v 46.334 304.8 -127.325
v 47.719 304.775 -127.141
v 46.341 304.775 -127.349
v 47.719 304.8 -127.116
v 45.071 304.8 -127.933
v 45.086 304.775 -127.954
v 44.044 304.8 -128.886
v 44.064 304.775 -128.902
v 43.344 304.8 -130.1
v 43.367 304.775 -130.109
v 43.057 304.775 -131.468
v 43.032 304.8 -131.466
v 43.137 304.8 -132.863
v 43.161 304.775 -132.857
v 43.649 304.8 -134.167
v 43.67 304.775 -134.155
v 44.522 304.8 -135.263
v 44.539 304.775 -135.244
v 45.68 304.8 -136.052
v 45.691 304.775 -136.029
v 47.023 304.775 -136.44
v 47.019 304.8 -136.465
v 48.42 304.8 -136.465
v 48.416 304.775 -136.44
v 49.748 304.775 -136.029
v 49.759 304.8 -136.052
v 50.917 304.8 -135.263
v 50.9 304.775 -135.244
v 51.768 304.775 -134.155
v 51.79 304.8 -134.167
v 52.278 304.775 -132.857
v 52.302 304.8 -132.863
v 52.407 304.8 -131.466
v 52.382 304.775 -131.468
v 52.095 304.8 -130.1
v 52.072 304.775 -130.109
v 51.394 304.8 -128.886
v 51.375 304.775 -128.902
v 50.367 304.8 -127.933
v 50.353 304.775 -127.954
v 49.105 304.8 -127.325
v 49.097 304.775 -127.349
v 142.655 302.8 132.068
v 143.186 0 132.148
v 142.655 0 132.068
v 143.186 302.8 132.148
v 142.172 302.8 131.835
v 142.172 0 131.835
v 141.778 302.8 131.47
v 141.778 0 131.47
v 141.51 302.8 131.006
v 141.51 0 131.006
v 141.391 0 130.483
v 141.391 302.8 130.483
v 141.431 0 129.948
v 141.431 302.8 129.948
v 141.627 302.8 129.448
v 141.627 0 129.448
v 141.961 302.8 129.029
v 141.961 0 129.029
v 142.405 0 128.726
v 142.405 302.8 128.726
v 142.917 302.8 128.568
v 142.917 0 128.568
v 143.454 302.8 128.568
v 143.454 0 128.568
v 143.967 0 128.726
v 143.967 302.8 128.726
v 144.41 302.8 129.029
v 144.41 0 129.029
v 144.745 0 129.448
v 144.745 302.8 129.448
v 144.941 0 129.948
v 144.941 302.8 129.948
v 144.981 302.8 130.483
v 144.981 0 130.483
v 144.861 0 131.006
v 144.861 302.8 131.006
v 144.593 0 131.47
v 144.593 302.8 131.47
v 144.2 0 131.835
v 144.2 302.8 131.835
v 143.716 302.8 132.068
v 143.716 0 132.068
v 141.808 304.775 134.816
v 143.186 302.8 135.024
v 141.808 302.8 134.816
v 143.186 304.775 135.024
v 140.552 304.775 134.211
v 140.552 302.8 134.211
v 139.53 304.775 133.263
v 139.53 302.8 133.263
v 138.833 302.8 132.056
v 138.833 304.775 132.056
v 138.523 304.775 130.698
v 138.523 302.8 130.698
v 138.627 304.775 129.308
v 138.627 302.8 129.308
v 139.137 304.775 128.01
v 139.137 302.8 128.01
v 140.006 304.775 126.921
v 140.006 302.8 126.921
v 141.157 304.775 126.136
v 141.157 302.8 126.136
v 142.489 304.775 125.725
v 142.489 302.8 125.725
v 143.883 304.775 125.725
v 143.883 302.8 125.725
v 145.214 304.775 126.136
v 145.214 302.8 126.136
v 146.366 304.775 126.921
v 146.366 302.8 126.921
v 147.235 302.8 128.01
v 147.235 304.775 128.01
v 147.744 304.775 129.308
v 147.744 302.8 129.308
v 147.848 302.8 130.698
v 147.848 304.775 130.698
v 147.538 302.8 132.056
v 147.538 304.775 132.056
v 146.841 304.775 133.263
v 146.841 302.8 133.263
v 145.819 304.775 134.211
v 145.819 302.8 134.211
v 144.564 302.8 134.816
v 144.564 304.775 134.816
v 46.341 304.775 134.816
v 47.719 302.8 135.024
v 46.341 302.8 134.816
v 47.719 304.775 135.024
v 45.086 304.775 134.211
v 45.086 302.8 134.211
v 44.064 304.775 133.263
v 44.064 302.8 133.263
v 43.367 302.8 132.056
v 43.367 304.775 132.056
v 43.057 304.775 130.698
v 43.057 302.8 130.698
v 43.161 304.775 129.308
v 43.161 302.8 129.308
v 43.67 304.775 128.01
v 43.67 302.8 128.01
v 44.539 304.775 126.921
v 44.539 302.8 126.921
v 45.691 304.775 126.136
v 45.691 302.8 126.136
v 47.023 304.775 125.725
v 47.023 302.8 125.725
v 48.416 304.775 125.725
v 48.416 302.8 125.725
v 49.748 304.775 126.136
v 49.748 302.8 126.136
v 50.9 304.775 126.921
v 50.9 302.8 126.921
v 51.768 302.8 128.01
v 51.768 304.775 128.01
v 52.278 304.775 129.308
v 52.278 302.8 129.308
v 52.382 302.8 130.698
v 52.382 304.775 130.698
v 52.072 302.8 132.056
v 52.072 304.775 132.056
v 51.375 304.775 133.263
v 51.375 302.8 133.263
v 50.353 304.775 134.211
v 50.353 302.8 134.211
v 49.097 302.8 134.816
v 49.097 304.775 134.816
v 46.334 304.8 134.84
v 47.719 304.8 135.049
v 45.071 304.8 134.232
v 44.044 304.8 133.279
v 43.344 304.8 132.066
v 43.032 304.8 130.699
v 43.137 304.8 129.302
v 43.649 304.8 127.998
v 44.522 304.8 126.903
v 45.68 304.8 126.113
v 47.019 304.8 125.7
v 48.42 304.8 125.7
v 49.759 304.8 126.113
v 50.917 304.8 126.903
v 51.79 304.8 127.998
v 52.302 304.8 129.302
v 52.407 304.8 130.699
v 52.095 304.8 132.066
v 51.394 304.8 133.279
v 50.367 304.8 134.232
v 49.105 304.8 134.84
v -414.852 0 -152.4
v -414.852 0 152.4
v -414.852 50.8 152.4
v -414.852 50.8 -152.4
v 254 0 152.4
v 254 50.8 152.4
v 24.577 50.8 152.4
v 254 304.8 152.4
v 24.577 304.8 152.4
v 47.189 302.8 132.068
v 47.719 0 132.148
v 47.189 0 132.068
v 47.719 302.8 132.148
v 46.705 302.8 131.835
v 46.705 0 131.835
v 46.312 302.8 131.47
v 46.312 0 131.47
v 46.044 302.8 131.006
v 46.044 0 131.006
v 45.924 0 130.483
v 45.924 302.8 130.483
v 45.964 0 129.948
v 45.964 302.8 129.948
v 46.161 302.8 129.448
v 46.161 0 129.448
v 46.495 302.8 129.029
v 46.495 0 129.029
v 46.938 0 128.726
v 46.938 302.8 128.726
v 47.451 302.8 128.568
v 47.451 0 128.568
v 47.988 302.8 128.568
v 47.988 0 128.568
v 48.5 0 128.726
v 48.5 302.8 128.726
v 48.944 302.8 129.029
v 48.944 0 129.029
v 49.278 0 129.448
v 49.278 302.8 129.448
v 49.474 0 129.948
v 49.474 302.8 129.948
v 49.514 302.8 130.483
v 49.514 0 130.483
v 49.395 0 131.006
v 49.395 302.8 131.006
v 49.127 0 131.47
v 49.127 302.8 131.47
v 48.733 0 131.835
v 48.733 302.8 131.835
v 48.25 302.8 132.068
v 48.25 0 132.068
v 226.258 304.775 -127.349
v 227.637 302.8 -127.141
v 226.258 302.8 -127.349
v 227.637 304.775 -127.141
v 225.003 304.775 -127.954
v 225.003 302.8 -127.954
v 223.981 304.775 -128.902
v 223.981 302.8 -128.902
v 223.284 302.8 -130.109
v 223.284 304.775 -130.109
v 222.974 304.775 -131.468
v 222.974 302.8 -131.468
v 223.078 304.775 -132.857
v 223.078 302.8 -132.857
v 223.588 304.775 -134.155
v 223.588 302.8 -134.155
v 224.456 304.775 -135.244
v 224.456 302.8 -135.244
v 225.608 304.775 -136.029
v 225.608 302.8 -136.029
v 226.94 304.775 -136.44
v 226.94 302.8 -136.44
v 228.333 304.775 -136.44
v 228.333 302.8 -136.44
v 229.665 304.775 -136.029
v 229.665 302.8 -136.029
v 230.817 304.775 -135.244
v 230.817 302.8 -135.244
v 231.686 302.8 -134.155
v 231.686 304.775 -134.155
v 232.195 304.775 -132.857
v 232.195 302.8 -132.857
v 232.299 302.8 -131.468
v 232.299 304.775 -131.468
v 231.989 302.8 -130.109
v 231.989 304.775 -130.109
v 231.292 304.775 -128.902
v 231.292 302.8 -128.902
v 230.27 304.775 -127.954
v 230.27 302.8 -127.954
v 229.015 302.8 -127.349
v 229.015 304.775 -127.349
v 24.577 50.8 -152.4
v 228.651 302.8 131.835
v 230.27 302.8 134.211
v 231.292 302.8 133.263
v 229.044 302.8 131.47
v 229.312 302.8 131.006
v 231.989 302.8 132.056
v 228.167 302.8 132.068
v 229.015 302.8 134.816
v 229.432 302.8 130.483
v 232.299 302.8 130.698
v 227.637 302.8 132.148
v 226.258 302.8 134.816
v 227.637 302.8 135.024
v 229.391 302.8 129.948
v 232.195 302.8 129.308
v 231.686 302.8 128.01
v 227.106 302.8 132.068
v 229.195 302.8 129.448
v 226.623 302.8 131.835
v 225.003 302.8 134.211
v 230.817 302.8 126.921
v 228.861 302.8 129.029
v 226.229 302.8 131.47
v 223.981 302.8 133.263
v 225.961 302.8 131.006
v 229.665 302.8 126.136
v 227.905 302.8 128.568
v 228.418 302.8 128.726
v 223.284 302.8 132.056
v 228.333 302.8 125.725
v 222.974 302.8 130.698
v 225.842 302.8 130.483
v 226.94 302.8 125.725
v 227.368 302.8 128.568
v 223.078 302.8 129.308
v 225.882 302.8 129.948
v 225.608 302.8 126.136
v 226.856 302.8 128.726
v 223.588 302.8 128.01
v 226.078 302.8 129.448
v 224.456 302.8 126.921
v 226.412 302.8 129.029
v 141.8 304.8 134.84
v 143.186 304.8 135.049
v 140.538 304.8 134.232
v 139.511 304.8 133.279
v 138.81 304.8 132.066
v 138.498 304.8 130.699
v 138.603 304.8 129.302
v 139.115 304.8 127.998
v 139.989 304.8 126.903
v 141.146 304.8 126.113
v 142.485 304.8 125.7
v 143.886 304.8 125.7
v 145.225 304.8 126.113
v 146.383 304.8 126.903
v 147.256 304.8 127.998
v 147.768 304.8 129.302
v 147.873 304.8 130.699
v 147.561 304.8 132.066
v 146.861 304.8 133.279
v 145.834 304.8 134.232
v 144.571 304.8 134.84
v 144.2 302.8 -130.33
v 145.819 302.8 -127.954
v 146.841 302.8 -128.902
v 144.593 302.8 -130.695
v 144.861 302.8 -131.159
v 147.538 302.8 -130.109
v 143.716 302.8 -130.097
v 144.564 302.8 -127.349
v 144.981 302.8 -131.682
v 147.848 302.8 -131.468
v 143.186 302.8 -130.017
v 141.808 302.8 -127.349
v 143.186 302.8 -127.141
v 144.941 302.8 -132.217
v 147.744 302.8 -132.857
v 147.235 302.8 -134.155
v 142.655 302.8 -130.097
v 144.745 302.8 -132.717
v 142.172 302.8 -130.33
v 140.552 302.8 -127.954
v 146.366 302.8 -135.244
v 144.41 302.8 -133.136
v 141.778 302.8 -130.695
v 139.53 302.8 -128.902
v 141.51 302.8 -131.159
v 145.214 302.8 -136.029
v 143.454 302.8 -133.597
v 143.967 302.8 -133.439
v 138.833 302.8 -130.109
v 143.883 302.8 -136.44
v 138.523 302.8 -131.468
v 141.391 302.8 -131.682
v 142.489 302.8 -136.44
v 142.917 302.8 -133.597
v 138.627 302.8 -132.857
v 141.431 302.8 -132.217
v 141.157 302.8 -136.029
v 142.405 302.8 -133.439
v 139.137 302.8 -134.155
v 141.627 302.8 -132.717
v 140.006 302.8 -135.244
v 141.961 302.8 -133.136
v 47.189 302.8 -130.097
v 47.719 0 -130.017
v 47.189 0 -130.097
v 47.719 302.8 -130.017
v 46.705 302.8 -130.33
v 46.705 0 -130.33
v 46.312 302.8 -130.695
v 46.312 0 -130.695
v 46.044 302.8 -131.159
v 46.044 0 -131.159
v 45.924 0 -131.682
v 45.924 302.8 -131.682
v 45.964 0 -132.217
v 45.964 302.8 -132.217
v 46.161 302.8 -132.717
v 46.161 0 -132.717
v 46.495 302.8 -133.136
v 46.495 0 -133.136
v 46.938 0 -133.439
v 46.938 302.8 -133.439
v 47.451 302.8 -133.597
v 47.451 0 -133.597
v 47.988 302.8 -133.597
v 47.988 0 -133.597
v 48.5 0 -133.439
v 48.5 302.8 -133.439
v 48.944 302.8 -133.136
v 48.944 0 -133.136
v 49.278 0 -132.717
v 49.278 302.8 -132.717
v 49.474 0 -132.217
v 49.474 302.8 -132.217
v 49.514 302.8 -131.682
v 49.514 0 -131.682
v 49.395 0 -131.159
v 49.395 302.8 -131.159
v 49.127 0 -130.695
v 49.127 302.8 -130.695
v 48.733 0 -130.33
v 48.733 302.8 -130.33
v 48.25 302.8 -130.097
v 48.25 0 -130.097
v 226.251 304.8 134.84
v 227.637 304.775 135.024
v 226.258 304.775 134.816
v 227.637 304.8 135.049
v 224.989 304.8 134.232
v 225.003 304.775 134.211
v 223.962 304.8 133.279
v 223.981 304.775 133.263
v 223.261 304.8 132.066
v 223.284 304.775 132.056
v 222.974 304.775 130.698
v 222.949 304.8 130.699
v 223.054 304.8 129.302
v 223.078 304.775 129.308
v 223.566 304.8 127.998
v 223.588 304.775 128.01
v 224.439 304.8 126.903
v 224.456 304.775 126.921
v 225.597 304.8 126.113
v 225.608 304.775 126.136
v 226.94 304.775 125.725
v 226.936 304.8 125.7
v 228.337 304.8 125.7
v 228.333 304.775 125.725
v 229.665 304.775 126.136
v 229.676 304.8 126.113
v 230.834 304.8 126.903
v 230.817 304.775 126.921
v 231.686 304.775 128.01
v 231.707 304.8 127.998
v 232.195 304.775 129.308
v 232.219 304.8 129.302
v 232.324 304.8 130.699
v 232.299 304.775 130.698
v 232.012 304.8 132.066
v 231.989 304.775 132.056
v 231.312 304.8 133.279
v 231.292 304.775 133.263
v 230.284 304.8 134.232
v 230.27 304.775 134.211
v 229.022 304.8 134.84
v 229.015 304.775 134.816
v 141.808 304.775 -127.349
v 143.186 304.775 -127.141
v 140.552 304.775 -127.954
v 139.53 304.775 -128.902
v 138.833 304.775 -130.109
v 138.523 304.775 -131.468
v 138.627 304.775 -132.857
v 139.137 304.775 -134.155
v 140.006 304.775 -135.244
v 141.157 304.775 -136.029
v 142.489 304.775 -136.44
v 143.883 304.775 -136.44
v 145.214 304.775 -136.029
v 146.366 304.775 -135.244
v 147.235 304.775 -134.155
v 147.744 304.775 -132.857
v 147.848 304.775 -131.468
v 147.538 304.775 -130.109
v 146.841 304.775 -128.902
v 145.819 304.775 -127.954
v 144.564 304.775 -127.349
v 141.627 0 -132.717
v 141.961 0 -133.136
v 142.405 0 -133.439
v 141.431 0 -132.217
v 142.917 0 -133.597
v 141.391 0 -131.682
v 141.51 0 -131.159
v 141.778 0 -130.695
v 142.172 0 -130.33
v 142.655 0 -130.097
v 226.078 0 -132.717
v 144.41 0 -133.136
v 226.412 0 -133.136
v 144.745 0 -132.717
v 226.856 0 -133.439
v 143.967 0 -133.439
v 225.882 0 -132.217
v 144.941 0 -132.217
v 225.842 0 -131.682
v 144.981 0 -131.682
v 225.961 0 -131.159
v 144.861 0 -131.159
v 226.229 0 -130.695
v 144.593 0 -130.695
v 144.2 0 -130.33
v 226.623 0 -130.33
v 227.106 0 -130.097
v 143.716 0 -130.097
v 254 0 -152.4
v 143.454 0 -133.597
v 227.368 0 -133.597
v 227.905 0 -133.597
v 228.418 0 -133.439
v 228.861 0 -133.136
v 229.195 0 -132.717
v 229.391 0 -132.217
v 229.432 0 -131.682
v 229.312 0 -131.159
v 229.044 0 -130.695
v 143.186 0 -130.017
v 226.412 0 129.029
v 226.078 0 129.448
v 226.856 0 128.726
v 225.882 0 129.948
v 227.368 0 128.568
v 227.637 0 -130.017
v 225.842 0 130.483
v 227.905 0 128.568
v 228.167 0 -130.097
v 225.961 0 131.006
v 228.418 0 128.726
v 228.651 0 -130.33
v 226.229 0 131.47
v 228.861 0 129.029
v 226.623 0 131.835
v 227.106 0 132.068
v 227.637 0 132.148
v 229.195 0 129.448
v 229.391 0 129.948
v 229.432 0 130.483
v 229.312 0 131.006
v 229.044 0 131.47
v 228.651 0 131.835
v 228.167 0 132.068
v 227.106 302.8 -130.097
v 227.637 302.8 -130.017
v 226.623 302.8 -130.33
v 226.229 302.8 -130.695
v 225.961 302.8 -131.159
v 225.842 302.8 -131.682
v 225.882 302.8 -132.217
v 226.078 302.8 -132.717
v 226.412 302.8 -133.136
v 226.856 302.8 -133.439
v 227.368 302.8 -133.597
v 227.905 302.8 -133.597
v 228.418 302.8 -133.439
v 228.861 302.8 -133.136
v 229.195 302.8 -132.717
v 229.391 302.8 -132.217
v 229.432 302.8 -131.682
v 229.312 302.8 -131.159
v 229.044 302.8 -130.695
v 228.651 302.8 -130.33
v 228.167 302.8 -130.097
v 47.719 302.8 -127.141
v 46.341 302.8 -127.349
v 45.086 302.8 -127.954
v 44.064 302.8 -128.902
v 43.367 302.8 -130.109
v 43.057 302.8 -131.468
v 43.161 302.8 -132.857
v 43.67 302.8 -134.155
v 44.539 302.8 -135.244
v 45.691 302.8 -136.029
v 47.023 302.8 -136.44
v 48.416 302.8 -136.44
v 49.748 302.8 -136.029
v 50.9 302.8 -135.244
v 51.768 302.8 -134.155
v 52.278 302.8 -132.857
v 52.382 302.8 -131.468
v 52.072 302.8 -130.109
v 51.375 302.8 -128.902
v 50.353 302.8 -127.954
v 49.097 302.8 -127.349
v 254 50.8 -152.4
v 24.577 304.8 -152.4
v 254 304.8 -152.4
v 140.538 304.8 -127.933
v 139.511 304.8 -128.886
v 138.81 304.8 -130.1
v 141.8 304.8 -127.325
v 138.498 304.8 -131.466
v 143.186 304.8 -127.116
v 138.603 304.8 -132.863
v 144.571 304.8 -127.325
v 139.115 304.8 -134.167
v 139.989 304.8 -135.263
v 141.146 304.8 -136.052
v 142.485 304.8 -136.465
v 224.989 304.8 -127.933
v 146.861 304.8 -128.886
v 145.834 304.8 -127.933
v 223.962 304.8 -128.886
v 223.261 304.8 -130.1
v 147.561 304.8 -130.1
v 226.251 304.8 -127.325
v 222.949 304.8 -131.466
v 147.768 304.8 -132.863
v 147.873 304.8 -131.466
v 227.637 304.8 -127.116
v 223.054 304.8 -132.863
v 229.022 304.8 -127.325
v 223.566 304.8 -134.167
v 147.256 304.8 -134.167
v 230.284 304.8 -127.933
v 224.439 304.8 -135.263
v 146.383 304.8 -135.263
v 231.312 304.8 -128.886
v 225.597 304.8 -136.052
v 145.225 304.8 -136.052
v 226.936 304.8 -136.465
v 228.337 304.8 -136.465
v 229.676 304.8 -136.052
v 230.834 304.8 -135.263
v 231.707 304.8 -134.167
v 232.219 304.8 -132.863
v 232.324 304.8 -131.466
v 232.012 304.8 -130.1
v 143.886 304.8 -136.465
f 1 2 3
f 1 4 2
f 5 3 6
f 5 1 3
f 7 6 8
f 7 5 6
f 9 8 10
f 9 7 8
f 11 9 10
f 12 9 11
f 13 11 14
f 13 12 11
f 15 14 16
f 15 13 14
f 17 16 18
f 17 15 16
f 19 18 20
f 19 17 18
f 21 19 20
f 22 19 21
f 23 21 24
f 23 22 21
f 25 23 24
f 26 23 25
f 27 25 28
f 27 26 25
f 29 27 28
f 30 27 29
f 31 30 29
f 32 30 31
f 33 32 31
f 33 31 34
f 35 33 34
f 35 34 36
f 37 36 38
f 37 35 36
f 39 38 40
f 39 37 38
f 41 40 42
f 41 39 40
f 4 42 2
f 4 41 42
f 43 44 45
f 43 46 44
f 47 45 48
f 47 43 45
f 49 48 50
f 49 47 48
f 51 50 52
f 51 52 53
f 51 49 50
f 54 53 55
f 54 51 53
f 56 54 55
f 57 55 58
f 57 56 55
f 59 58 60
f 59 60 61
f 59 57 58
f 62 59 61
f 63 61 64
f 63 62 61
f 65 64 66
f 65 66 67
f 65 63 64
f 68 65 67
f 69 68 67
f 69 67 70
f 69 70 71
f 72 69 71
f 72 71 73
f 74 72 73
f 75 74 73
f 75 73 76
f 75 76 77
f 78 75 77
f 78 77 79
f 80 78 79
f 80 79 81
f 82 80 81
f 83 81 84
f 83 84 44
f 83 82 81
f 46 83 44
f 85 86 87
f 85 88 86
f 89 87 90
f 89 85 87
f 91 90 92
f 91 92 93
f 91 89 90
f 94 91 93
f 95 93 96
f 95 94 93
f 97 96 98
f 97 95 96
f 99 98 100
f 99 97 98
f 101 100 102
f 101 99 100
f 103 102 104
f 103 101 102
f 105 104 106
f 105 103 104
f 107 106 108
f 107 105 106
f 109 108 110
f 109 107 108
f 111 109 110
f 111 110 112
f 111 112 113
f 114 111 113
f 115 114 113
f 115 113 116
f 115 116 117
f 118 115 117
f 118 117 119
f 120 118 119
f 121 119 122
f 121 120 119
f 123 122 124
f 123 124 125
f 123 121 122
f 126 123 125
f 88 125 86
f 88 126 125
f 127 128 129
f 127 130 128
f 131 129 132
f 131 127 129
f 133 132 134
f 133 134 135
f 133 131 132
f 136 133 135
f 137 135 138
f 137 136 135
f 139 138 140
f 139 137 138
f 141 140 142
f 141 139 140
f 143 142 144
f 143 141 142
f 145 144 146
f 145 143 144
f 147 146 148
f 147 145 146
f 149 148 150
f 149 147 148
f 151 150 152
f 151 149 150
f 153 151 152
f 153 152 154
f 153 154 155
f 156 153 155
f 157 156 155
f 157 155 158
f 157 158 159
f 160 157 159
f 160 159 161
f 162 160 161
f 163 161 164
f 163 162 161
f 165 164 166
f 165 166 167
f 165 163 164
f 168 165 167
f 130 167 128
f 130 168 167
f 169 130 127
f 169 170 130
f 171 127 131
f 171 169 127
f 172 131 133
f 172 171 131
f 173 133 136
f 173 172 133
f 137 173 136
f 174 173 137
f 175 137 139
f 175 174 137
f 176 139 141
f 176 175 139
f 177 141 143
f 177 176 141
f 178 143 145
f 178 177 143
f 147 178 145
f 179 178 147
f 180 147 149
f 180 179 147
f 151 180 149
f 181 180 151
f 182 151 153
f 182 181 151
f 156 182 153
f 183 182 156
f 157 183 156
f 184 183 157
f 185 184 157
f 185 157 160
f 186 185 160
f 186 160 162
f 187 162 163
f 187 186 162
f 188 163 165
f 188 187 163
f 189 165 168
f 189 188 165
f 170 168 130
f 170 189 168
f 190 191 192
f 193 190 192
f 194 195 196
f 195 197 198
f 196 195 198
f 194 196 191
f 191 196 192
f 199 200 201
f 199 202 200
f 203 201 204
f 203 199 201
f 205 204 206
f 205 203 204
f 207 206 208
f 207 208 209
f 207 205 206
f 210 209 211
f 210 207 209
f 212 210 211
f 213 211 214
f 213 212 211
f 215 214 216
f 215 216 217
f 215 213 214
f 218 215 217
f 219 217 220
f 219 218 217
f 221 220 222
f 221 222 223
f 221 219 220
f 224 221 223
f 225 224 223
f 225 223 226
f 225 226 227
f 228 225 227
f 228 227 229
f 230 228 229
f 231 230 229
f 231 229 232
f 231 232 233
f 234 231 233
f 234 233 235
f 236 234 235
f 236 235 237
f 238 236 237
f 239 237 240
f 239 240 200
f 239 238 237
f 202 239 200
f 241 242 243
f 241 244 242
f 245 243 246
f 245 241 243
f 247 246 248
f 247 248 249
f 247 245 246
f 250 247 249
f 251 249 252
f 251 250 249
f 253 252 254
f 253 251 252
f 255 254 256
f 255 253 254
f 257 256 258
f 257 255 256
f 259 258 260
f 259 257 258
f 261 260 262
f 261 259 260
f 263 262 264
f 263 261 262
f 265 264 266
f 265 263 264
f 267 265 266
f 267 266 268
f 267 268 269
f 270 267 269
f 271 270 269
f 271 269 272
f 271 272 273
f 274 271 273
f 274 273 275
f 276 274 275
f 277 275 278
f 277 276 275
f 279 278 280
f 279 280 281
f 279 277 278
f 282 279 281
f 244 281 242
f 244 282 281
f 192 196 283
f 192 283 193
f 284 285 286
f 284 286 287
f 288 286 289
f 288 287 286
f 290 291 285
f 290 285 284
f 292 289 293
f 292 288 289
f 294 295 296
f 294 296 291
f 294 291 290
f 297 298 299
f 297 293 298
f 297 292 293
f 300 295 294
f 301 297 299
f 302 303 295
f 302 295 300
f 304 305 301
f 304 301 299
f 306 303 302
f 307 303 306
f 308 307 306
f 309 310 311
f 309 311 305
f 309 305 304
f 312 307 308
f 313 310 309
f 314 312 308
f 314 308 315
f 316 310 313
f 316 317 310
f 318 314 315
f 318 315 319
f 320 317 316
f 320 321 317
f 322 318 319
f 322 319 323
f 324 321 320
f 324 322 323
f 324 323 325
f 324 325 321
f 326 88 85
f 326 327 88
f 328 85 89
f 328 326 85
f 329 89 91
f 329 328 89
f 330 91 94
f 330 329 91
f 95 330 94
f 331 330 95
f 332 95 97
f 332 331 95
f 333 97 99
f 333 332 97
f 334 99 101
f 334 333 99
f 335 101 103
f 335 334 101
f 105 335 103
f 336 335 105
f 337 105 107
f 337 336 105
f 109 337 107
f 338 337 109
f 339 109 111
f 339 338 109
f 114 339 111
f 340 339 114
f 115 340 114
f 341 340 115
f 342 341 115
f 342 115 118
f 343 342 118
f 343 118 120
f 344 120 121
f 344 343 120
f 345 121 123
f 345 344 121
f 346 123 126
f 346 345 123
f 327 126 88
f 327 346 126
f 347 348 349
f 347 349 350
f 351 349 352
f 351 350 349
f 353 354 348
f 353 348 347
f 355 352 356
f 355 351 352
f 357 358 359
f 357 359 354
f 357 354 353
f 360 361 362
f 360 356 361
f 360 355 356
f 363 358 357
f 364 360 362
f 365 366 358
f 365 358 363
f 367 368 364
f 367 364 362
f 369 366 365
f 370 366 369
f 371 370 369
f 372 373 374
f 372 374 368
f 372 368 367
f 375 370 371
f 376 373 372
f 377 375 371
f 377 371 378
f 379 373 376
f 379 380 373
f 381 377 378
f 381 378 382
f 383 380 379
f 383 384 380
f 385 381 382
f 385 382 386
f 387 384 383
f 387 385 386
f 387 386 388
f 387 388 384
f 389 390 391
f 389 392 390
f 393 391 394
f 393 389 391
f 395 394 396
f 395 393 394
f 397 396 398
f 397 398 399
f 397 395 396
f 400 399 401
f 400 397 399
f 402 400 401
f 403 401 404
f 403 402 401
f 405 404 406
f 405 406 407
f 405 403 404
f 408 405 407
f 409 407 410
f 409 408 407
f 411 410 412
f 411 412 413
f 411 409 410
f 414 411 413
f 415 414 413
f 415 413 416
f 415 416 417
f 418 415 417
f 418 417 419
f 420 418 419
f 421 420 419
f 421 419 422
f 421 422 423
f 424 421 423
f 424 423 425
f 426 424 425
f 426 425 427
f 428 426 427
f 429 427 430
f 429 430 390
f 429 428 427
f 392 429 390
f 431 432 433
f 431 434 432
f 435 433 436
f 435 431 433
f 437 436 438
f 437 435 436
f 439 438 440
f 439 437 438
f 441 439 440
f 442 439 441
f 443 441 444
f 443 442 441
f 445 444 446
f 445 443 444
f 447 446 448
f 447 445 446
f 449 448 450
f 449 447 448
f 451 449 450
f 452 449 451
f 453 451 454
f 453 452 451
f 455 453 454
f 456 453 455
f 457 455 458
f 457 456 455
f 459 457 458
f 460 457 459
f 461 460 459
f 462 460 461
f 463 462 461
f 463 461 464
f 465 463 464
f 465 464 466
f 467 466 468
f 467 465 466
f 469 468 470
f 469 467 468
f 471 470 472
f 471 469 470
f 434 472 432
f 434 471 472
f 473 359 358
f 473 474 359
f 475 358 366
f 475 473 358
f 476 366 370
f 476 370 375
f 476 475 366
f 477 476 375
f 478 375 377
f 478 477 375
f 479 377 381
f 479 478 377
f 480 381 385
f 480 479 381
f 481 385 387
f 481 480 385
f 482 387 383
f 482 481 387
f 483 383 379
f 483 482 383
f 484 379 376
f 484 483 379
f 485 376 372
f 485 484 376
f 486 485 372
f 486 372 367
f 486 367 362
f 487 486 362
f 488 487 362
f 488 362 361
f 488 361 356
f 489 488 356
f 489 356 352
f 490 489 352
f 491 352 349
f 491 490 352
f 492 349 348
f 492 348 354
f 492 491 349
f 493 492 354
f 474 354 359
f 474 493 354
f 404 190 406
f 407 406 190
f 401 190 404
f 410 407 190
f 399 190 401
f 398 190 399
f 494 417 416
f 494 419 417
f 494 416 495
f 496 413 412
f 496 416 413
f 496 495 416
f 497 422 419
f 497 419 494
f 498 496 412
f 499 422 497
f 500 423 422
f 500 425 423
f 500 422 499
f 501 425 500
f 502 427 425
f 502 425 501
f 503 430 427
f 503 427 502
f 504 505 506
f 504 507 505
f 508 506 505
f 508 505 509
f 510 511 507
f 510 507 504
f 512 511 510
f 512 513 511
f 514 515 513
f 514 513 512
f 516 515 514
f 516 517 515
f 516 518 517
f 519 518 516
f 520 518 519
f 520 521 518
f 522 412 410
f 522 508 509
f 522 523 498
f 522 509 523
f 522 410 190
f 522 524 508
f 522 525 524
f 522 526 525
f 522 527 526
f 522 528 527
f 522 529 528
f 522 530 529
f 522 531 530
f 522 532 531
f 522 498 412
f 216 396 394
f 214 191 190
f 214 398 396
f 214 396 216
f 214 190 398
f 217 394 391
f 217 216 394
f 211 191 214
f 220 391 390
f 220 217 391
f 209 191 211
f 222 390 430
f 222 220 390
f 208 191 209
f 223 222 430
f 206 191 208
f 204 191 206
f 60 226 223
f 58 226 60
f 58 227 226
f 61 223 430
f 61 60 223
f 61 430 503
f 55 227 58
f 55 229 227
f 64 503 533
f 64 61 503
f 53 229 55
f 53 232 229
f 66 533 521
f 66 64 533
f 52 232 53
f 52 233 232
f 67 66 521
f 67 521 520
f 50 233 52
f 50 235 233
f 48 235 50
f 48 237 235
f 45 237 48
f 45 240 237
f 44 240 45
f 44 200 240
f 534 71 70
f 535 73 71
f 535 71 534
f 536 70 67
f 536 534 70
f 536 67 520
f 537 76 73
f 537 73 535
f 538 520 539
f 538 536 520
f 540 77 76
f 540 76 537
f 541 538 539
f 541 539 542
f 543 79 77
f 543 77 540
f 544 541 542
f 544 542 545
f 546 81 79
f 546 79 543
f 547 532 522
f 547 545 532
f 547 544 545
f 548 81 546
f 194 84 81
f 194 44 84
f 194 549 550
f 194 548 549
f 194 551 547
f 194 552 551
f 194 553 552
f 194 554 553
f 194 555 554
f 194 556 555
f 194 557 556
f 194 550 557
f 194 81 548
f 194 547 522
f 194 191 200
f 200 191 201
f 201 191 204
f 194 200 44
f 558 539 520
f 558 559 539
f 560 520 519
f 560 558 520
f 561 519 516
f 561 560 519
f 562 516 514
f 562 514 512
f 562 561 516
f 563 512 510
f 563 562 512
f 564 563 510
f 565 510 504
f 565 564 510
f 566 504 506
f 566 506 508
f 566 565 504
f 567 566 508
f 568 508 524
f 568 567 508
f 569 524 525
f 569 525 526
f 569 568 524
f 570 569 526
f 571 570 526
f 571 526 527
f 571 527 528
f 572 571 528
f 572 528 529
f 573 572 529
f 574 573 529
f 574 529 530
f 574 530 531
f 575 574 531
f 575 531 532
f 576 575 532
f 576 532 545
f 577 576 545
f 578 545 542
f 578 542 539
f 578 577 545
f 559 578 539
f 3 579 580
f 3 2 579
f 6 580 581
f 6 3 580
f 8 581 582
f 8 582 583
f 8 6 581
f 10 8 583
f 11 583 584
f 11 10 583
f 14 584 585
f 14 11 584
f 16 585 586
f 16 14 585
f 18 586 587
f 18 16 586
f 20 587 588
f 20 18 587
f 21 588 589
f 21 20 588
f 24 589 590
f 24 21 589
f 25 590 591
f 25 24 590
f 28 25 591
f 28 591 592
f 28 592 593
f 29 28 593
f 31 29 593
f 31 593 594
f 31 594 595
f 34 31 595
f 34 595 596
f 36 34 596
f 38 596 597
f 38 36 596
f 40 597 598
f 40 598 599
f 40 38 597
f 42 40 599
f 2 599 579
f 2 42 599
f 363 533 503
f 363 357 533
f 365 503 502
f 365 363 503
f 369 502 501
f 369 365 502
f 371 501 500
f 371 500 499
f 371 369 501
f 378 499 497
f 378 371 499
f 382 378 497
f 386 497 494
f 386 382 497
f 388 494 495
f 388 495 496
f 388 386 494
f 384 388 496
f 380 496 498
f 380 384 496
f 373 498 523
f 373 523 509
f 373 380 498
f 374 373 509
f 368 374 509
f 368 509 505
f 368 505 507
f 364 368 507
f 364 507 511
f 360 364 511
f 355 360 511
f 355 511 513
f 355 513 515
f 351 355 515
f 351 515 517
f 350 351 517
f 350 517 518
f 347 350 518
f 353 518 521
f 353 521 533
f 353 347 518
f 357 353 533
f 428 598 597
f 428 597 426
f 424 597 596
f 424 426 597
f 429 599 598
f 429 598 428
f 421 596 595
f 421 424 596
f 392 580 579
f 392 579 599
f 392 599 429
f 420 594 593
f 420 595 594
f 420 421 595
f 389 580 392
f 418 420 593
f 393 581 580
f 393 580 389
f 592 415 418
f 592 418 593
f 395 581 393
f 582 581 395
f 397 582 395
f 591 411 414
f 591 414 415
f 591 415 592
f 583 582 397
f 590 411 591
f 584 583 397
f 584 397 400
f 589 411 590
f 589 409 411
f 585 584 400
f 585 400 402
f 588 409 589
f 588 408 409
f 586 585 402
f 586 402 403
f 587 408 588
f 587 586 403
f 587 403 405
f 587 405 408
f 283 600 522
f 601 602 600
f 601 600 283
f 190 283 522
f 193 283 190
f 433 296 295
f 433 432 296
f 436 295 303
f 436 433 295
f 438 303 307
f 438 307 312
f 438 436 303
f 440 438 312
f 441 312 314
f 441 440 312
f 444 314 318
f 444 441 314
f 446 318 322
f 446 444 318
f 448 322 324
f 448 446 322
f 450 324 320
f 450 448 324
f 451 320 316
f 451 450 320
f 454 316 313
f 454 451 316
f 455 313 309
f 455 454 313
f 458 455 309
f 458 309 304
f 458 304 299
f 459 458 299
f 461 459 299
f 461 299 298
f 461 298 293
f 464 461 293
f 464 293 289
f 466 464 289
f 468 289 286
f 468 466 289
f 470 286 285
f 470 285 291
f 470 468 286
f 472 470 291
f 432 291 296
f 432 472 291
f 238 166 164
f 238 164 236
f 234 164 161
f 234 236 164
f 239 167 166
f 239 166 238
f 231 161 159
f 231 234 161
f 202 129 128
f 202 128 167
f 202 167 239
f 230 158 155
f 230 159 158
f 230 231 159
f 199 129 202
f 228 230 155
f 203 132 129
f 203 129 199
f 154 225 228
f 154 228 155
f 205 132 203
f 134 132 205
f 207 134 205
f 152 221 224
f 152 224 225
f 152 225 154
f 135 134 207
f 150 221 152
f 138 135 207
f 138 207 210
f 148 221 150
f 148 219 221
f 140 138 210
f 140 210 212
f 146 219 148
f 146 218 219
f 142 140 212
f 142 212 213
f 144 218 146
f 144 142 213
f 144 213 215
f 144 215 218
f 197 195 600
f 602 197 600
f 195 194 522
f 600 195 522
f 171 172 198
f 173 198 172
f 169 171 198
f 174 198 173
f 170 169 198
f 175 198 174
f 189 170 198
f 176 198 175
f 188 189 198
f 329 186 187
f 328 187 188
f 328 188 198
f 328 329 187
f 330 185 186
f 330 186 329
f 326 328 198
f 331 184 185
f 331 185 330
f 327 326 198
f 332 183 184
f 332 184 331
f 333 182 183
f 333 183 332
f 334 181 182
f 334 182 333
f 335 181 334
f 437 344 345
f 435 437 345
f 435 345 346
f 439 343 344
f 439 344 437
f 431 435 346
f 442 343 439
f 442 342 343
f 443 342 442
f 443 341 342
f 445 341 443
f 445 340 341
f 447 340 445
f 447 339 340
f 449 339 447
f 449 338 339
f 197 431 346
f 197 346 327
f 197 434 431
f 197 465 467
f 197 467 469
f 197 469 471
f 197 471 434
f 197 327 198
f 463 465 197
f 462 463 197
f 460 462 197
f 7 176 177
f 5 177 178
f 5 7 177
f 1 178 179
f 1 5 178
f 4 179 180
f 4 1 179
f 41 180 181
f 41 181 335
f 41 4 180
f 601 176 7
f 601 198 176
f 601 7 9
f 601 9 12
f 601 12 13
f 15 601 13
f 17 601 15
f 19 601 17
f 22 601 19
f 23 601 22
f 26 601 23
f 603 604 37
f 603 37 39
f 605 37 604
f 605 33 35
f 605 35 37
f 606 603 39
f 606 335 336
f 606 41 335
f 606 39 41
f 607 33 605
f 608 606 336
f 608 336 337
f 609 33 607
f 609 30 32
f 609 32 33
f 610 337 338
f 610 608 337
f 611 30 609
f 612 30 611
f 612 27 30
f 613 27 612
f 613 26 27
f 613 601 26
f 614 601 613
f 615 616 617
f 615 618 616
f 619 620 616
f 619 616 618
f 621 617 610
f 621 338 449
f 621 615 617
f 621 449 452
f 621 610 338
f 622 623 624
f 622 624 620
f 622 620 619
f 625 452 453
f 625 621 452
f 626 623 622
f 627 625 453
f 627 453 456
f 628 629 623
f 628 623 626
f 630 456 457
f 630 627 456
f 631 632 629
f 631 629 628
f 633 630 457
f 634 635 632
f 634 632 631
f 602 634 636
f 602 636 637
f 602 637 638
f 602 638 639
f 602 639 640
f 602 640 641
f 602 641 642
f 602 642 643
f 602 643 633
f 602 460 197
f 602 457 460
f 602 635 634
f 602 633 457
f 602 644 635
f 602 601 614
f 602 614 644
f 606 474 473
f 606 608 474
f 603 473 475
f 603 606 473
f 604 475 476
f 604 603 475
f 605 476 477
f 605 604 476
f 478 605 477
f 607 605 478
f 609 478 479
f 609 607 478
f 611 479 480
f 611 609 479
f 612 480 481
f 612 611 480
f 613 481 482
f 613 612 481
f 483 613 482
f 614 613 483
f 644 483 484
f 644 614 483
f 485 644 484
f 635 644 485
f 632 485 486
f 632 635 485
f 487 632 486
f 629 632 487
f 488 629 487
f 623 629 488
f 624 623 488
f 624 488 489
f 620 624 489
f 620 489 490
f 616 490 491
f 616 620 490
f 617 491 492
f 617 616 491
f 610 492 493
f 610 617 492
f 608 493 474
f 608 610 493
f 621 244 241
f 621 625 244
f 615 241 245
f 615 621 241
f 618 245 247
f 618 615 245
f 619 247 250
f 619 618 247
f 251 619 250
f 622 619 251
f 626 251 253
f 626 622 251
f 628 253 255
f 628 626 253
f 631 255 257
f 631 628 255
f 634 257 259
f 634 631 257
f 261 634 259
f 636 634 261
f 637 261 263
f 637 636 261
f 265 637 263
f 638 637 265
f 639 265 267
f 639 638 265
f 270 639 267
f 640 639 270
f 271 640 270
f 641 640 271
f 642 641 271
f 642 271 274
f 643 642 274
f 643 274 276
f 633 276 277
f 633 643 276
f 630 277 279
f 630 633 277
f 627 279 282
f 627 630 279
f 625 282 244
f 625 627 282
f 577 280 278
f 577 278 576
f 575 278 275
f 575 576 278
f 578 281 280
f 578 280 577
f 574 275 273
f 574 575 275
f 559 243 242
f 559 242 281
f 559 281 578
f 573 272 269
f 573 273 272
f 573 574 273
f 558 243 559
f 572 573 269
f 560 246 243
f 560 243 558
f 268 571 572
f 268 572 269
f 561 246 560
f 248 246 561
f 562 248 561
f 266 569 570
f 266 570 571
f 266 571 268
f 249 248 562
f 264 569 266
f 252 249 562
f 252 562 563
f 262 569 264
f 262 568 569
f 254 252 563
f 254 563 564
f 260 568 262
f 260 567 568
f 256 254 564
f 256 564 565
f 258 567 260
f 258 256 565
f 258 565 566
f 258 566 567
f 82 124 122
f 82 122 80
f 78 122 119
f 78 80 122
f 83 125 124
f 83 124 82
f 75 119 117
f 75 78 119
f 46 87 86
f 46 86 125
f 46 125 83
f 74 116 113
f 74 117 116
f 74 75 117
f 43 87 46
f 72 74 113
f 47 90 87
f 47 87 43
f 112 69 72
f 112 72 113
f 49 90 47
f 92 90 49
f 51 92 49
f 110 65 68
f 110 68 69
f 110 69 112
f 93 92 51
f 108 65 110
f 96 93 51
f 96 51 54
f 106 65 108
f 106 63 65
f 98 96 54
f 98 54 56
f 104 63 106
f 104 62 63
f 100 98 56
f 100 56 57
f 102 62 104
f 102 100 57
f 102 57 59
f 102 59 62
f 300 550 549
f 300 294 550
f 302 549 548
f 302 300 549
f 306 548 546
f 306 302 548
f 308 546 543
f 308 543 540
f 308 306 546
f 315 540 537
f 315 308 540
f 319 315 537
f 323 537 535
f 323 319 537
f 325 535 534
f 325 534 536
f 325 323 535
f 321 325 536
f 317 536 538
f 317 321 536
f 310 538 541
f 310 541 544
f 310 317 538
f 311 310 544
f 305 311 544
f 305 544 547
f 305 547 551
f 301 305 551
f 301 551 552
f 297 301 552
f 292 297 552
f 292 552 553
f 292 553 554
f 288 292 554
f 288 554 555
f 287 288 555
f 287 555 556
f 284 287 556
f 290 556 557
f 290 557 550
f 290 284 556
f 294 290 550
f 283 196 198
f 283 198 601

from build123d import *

# Parameters (mm, degrees)
SKETCH1_W                                   = 508
SKETCH1_H                                   = 304.8
BOSS_EXTRUDE1_DEPTH                         = 50.8
SKETCH2_W                                   = 229.423241107
SKETCH2_H                                   = 304.8
BOSS_EXTRUDE2_DEPTH                         = 254
BOSS_EXTRUDE3_DEPTH                         = 304.8
CBORE_FOR_M3_HEX_HEAD_CAP_SCREW1_AT_2_COUNT = 2
CBORE_FOR_M3_HEX_HEAD_CAP_SCREW1_AT_2_PITCH = 95.46630017
CBORE_FOR_M3_HEX_HEAD_CAP_SCREW1_AT_3_COUNT = 2
CBORE_FOR_M3_HEX_HEAD_CAP_SCREW1_AT_3_PITCH = 179.917258012
CBORE_FOR_M3_HEX_HEAD_CAP_SCREW1_AT_4_COUNT = 2
CBORE_FOR_M3_HEX_HEAD_CAP_SCREW1_AT_4_PITCH = 317.963495132
CBORE_FOR_M3_HEX_HEAD_CAP_SCREW1_AT_5_COUNT = 2
CBORE_FOR_M3_HEX_HEAD_CAP_SCREW1_AT_5_PITCH = 279.006055443
CBORE_FOR_M3_HEX_HEAD_CAP_SCREW1_AT_6_COUNT = 2
CBORE_FOR_M3_HEX_HEAD_CAP_SCREW1_AT_6_PITCH = 262.165147389


with BuildPart() as part:
    # Sketch1 → Boss-Extrude1 (new body)
    with BuildSketch(Plane(origin=(0, 0, 0), x_dir=(1, 0, 0), z_dir=(0, 1, 0))):
        Rectangle(SKETCH1_W, SKETCH1_H)
    extrude(amount=BOSS_EXTRUDE1_DEPTH)

    # Sketch2 → Boss-Extrude2 (add)
    with BuildSketch(Plane(origin=(0, 50.8, 0), x_dir=(1, 0, 0), z_dir=(0, 1, 0))):
        with Locations((139.288379447, 0)):
            Rectangle(SKETCH2_W, SKETCH2_H)
    extrude(amount=BOSS_EXTRUDE2_DEPTH)

    # Sketch3 → Boss-Extrude3 (add)
    with BuildSketch(Plane.XY.offset(152.4)):
        Polygon((-254, 0), (-414.851586113, 0), (-414.851586113, 50.8), (-254, 50.8), (24.576758893, 50.8), (24.576758893, 304.8), (254, 304.8), (254, 0), align=None)
    extrude(amount=-BOSS_EXTRUDE3_DEPTH)

    # Sketch6 → CBORE for M3 Hex Head Cap Screw1 (revolve, cut)
    with BuildSketch(Plane(origin=(47.719356018, 304.8, -131.81692985), x_dir=(0, 0, 1), z_dir=(1, 0, 0))):
        Polygon((0, 0), (0, 304.8), (1.8, 304.8), (1.8, 2), (4.6755, 2), (4.6755, 0.025), (4.7005, 0), align=None)
    cbore_for_m3_hex_head_cap_screw1 = revolve(axis=Axis((47.719356018, 311.15, -131.81692985), (0, -1, 0)), mode=Mode.SUBTRACT)

    # CBORE for M3 Hex Head Cap Screw1 at 2: CBORE for M3 Hex Head Cap Screw1 ×2
    with Locations(*[(i * CBORE_FOR_M3_HEX_HEAD_CAP_SCREW1_AT_2_PITCH, 0, 0) for i in range(1, CBORE_FOR_M3_HEX_HEAD_CAP_SCREW1_AT_2_COUNT)]):
        add(cbore_for_m3_hex_head_cap_screw1, mode=Mode.SUBTRACT)

    # CBORE for M3 Hex Head Cap Screw1 at 3: CBORE for M3 Hex Head Cap Screw1 ×2
    with Locations(*[(i * CBORE_FOR_M3_HEX_HEAD_CAP_SCREW1_AT_3_PITCH, 0, 0) for i in range(1, CBORE_FOR_M3_HEX_HEAD_CAP_SCREW1_AT_3_COUNT)]):
        add(cbore_for_m3_hex_head_cap_screw1, mode=Mode.SUBTRACT)

    # CBORE for M3 Hex Head Cap Screw1 at 4: CBORE for M3 Hex Head Cap Screw1 ×2
    with Locations(*[Vector(0.565842497, 0, 0.824513353) * (i * CBORE_FOR_M3_HEX_HEAD_CAP_SCREW1_AT_4_PITCH) for i in range(1, CBORE_FOR_M3_HEX_HEAD_CAP_SCREW1_AT_4_COUNT)]):
        add(cbore_for_m3_hex_head_cap_screw1, mode=Mode.SUBTRACT)

    # CBORE for M3 Hex Head Cap Screw1 at 5: CBORE for M3 Hex Head Cap Screw1 ×2
    with Locations(*[Vector(0.342165692, 0, 0.939639632) * (i * CBORE_FOR_M3_HEX_HEAD_CAP_SCREW1_AT_5_PITCH) for i in range(1, CBORE_FOR_M3_HEX_HEAD_CAP_SCREW1_AT_5_COUNT)]):
        add(cbore_for_m3_hex_head_cap_screw1, mode=Mode.SUBTRACT)

    # CBORE for M3 Hex Head Cap Screw1 at 6: CBORE for M3 Hex Head Cap Screw1 ×2
    with Locations(*[(0, 0, i * CBORE_FOR_M3_HEX_HEAD_CAP_SCREW1_AT_6_PITCH) for i in range(1, CBORE_FOR_M3_HEX_HEAD_CAP_SCREW1_AT_6_COUNT)]):
        add(cbore_for_m3_hex_head_cap_screw1, mode=Mode.SUBTRACT)


solid = part.part
